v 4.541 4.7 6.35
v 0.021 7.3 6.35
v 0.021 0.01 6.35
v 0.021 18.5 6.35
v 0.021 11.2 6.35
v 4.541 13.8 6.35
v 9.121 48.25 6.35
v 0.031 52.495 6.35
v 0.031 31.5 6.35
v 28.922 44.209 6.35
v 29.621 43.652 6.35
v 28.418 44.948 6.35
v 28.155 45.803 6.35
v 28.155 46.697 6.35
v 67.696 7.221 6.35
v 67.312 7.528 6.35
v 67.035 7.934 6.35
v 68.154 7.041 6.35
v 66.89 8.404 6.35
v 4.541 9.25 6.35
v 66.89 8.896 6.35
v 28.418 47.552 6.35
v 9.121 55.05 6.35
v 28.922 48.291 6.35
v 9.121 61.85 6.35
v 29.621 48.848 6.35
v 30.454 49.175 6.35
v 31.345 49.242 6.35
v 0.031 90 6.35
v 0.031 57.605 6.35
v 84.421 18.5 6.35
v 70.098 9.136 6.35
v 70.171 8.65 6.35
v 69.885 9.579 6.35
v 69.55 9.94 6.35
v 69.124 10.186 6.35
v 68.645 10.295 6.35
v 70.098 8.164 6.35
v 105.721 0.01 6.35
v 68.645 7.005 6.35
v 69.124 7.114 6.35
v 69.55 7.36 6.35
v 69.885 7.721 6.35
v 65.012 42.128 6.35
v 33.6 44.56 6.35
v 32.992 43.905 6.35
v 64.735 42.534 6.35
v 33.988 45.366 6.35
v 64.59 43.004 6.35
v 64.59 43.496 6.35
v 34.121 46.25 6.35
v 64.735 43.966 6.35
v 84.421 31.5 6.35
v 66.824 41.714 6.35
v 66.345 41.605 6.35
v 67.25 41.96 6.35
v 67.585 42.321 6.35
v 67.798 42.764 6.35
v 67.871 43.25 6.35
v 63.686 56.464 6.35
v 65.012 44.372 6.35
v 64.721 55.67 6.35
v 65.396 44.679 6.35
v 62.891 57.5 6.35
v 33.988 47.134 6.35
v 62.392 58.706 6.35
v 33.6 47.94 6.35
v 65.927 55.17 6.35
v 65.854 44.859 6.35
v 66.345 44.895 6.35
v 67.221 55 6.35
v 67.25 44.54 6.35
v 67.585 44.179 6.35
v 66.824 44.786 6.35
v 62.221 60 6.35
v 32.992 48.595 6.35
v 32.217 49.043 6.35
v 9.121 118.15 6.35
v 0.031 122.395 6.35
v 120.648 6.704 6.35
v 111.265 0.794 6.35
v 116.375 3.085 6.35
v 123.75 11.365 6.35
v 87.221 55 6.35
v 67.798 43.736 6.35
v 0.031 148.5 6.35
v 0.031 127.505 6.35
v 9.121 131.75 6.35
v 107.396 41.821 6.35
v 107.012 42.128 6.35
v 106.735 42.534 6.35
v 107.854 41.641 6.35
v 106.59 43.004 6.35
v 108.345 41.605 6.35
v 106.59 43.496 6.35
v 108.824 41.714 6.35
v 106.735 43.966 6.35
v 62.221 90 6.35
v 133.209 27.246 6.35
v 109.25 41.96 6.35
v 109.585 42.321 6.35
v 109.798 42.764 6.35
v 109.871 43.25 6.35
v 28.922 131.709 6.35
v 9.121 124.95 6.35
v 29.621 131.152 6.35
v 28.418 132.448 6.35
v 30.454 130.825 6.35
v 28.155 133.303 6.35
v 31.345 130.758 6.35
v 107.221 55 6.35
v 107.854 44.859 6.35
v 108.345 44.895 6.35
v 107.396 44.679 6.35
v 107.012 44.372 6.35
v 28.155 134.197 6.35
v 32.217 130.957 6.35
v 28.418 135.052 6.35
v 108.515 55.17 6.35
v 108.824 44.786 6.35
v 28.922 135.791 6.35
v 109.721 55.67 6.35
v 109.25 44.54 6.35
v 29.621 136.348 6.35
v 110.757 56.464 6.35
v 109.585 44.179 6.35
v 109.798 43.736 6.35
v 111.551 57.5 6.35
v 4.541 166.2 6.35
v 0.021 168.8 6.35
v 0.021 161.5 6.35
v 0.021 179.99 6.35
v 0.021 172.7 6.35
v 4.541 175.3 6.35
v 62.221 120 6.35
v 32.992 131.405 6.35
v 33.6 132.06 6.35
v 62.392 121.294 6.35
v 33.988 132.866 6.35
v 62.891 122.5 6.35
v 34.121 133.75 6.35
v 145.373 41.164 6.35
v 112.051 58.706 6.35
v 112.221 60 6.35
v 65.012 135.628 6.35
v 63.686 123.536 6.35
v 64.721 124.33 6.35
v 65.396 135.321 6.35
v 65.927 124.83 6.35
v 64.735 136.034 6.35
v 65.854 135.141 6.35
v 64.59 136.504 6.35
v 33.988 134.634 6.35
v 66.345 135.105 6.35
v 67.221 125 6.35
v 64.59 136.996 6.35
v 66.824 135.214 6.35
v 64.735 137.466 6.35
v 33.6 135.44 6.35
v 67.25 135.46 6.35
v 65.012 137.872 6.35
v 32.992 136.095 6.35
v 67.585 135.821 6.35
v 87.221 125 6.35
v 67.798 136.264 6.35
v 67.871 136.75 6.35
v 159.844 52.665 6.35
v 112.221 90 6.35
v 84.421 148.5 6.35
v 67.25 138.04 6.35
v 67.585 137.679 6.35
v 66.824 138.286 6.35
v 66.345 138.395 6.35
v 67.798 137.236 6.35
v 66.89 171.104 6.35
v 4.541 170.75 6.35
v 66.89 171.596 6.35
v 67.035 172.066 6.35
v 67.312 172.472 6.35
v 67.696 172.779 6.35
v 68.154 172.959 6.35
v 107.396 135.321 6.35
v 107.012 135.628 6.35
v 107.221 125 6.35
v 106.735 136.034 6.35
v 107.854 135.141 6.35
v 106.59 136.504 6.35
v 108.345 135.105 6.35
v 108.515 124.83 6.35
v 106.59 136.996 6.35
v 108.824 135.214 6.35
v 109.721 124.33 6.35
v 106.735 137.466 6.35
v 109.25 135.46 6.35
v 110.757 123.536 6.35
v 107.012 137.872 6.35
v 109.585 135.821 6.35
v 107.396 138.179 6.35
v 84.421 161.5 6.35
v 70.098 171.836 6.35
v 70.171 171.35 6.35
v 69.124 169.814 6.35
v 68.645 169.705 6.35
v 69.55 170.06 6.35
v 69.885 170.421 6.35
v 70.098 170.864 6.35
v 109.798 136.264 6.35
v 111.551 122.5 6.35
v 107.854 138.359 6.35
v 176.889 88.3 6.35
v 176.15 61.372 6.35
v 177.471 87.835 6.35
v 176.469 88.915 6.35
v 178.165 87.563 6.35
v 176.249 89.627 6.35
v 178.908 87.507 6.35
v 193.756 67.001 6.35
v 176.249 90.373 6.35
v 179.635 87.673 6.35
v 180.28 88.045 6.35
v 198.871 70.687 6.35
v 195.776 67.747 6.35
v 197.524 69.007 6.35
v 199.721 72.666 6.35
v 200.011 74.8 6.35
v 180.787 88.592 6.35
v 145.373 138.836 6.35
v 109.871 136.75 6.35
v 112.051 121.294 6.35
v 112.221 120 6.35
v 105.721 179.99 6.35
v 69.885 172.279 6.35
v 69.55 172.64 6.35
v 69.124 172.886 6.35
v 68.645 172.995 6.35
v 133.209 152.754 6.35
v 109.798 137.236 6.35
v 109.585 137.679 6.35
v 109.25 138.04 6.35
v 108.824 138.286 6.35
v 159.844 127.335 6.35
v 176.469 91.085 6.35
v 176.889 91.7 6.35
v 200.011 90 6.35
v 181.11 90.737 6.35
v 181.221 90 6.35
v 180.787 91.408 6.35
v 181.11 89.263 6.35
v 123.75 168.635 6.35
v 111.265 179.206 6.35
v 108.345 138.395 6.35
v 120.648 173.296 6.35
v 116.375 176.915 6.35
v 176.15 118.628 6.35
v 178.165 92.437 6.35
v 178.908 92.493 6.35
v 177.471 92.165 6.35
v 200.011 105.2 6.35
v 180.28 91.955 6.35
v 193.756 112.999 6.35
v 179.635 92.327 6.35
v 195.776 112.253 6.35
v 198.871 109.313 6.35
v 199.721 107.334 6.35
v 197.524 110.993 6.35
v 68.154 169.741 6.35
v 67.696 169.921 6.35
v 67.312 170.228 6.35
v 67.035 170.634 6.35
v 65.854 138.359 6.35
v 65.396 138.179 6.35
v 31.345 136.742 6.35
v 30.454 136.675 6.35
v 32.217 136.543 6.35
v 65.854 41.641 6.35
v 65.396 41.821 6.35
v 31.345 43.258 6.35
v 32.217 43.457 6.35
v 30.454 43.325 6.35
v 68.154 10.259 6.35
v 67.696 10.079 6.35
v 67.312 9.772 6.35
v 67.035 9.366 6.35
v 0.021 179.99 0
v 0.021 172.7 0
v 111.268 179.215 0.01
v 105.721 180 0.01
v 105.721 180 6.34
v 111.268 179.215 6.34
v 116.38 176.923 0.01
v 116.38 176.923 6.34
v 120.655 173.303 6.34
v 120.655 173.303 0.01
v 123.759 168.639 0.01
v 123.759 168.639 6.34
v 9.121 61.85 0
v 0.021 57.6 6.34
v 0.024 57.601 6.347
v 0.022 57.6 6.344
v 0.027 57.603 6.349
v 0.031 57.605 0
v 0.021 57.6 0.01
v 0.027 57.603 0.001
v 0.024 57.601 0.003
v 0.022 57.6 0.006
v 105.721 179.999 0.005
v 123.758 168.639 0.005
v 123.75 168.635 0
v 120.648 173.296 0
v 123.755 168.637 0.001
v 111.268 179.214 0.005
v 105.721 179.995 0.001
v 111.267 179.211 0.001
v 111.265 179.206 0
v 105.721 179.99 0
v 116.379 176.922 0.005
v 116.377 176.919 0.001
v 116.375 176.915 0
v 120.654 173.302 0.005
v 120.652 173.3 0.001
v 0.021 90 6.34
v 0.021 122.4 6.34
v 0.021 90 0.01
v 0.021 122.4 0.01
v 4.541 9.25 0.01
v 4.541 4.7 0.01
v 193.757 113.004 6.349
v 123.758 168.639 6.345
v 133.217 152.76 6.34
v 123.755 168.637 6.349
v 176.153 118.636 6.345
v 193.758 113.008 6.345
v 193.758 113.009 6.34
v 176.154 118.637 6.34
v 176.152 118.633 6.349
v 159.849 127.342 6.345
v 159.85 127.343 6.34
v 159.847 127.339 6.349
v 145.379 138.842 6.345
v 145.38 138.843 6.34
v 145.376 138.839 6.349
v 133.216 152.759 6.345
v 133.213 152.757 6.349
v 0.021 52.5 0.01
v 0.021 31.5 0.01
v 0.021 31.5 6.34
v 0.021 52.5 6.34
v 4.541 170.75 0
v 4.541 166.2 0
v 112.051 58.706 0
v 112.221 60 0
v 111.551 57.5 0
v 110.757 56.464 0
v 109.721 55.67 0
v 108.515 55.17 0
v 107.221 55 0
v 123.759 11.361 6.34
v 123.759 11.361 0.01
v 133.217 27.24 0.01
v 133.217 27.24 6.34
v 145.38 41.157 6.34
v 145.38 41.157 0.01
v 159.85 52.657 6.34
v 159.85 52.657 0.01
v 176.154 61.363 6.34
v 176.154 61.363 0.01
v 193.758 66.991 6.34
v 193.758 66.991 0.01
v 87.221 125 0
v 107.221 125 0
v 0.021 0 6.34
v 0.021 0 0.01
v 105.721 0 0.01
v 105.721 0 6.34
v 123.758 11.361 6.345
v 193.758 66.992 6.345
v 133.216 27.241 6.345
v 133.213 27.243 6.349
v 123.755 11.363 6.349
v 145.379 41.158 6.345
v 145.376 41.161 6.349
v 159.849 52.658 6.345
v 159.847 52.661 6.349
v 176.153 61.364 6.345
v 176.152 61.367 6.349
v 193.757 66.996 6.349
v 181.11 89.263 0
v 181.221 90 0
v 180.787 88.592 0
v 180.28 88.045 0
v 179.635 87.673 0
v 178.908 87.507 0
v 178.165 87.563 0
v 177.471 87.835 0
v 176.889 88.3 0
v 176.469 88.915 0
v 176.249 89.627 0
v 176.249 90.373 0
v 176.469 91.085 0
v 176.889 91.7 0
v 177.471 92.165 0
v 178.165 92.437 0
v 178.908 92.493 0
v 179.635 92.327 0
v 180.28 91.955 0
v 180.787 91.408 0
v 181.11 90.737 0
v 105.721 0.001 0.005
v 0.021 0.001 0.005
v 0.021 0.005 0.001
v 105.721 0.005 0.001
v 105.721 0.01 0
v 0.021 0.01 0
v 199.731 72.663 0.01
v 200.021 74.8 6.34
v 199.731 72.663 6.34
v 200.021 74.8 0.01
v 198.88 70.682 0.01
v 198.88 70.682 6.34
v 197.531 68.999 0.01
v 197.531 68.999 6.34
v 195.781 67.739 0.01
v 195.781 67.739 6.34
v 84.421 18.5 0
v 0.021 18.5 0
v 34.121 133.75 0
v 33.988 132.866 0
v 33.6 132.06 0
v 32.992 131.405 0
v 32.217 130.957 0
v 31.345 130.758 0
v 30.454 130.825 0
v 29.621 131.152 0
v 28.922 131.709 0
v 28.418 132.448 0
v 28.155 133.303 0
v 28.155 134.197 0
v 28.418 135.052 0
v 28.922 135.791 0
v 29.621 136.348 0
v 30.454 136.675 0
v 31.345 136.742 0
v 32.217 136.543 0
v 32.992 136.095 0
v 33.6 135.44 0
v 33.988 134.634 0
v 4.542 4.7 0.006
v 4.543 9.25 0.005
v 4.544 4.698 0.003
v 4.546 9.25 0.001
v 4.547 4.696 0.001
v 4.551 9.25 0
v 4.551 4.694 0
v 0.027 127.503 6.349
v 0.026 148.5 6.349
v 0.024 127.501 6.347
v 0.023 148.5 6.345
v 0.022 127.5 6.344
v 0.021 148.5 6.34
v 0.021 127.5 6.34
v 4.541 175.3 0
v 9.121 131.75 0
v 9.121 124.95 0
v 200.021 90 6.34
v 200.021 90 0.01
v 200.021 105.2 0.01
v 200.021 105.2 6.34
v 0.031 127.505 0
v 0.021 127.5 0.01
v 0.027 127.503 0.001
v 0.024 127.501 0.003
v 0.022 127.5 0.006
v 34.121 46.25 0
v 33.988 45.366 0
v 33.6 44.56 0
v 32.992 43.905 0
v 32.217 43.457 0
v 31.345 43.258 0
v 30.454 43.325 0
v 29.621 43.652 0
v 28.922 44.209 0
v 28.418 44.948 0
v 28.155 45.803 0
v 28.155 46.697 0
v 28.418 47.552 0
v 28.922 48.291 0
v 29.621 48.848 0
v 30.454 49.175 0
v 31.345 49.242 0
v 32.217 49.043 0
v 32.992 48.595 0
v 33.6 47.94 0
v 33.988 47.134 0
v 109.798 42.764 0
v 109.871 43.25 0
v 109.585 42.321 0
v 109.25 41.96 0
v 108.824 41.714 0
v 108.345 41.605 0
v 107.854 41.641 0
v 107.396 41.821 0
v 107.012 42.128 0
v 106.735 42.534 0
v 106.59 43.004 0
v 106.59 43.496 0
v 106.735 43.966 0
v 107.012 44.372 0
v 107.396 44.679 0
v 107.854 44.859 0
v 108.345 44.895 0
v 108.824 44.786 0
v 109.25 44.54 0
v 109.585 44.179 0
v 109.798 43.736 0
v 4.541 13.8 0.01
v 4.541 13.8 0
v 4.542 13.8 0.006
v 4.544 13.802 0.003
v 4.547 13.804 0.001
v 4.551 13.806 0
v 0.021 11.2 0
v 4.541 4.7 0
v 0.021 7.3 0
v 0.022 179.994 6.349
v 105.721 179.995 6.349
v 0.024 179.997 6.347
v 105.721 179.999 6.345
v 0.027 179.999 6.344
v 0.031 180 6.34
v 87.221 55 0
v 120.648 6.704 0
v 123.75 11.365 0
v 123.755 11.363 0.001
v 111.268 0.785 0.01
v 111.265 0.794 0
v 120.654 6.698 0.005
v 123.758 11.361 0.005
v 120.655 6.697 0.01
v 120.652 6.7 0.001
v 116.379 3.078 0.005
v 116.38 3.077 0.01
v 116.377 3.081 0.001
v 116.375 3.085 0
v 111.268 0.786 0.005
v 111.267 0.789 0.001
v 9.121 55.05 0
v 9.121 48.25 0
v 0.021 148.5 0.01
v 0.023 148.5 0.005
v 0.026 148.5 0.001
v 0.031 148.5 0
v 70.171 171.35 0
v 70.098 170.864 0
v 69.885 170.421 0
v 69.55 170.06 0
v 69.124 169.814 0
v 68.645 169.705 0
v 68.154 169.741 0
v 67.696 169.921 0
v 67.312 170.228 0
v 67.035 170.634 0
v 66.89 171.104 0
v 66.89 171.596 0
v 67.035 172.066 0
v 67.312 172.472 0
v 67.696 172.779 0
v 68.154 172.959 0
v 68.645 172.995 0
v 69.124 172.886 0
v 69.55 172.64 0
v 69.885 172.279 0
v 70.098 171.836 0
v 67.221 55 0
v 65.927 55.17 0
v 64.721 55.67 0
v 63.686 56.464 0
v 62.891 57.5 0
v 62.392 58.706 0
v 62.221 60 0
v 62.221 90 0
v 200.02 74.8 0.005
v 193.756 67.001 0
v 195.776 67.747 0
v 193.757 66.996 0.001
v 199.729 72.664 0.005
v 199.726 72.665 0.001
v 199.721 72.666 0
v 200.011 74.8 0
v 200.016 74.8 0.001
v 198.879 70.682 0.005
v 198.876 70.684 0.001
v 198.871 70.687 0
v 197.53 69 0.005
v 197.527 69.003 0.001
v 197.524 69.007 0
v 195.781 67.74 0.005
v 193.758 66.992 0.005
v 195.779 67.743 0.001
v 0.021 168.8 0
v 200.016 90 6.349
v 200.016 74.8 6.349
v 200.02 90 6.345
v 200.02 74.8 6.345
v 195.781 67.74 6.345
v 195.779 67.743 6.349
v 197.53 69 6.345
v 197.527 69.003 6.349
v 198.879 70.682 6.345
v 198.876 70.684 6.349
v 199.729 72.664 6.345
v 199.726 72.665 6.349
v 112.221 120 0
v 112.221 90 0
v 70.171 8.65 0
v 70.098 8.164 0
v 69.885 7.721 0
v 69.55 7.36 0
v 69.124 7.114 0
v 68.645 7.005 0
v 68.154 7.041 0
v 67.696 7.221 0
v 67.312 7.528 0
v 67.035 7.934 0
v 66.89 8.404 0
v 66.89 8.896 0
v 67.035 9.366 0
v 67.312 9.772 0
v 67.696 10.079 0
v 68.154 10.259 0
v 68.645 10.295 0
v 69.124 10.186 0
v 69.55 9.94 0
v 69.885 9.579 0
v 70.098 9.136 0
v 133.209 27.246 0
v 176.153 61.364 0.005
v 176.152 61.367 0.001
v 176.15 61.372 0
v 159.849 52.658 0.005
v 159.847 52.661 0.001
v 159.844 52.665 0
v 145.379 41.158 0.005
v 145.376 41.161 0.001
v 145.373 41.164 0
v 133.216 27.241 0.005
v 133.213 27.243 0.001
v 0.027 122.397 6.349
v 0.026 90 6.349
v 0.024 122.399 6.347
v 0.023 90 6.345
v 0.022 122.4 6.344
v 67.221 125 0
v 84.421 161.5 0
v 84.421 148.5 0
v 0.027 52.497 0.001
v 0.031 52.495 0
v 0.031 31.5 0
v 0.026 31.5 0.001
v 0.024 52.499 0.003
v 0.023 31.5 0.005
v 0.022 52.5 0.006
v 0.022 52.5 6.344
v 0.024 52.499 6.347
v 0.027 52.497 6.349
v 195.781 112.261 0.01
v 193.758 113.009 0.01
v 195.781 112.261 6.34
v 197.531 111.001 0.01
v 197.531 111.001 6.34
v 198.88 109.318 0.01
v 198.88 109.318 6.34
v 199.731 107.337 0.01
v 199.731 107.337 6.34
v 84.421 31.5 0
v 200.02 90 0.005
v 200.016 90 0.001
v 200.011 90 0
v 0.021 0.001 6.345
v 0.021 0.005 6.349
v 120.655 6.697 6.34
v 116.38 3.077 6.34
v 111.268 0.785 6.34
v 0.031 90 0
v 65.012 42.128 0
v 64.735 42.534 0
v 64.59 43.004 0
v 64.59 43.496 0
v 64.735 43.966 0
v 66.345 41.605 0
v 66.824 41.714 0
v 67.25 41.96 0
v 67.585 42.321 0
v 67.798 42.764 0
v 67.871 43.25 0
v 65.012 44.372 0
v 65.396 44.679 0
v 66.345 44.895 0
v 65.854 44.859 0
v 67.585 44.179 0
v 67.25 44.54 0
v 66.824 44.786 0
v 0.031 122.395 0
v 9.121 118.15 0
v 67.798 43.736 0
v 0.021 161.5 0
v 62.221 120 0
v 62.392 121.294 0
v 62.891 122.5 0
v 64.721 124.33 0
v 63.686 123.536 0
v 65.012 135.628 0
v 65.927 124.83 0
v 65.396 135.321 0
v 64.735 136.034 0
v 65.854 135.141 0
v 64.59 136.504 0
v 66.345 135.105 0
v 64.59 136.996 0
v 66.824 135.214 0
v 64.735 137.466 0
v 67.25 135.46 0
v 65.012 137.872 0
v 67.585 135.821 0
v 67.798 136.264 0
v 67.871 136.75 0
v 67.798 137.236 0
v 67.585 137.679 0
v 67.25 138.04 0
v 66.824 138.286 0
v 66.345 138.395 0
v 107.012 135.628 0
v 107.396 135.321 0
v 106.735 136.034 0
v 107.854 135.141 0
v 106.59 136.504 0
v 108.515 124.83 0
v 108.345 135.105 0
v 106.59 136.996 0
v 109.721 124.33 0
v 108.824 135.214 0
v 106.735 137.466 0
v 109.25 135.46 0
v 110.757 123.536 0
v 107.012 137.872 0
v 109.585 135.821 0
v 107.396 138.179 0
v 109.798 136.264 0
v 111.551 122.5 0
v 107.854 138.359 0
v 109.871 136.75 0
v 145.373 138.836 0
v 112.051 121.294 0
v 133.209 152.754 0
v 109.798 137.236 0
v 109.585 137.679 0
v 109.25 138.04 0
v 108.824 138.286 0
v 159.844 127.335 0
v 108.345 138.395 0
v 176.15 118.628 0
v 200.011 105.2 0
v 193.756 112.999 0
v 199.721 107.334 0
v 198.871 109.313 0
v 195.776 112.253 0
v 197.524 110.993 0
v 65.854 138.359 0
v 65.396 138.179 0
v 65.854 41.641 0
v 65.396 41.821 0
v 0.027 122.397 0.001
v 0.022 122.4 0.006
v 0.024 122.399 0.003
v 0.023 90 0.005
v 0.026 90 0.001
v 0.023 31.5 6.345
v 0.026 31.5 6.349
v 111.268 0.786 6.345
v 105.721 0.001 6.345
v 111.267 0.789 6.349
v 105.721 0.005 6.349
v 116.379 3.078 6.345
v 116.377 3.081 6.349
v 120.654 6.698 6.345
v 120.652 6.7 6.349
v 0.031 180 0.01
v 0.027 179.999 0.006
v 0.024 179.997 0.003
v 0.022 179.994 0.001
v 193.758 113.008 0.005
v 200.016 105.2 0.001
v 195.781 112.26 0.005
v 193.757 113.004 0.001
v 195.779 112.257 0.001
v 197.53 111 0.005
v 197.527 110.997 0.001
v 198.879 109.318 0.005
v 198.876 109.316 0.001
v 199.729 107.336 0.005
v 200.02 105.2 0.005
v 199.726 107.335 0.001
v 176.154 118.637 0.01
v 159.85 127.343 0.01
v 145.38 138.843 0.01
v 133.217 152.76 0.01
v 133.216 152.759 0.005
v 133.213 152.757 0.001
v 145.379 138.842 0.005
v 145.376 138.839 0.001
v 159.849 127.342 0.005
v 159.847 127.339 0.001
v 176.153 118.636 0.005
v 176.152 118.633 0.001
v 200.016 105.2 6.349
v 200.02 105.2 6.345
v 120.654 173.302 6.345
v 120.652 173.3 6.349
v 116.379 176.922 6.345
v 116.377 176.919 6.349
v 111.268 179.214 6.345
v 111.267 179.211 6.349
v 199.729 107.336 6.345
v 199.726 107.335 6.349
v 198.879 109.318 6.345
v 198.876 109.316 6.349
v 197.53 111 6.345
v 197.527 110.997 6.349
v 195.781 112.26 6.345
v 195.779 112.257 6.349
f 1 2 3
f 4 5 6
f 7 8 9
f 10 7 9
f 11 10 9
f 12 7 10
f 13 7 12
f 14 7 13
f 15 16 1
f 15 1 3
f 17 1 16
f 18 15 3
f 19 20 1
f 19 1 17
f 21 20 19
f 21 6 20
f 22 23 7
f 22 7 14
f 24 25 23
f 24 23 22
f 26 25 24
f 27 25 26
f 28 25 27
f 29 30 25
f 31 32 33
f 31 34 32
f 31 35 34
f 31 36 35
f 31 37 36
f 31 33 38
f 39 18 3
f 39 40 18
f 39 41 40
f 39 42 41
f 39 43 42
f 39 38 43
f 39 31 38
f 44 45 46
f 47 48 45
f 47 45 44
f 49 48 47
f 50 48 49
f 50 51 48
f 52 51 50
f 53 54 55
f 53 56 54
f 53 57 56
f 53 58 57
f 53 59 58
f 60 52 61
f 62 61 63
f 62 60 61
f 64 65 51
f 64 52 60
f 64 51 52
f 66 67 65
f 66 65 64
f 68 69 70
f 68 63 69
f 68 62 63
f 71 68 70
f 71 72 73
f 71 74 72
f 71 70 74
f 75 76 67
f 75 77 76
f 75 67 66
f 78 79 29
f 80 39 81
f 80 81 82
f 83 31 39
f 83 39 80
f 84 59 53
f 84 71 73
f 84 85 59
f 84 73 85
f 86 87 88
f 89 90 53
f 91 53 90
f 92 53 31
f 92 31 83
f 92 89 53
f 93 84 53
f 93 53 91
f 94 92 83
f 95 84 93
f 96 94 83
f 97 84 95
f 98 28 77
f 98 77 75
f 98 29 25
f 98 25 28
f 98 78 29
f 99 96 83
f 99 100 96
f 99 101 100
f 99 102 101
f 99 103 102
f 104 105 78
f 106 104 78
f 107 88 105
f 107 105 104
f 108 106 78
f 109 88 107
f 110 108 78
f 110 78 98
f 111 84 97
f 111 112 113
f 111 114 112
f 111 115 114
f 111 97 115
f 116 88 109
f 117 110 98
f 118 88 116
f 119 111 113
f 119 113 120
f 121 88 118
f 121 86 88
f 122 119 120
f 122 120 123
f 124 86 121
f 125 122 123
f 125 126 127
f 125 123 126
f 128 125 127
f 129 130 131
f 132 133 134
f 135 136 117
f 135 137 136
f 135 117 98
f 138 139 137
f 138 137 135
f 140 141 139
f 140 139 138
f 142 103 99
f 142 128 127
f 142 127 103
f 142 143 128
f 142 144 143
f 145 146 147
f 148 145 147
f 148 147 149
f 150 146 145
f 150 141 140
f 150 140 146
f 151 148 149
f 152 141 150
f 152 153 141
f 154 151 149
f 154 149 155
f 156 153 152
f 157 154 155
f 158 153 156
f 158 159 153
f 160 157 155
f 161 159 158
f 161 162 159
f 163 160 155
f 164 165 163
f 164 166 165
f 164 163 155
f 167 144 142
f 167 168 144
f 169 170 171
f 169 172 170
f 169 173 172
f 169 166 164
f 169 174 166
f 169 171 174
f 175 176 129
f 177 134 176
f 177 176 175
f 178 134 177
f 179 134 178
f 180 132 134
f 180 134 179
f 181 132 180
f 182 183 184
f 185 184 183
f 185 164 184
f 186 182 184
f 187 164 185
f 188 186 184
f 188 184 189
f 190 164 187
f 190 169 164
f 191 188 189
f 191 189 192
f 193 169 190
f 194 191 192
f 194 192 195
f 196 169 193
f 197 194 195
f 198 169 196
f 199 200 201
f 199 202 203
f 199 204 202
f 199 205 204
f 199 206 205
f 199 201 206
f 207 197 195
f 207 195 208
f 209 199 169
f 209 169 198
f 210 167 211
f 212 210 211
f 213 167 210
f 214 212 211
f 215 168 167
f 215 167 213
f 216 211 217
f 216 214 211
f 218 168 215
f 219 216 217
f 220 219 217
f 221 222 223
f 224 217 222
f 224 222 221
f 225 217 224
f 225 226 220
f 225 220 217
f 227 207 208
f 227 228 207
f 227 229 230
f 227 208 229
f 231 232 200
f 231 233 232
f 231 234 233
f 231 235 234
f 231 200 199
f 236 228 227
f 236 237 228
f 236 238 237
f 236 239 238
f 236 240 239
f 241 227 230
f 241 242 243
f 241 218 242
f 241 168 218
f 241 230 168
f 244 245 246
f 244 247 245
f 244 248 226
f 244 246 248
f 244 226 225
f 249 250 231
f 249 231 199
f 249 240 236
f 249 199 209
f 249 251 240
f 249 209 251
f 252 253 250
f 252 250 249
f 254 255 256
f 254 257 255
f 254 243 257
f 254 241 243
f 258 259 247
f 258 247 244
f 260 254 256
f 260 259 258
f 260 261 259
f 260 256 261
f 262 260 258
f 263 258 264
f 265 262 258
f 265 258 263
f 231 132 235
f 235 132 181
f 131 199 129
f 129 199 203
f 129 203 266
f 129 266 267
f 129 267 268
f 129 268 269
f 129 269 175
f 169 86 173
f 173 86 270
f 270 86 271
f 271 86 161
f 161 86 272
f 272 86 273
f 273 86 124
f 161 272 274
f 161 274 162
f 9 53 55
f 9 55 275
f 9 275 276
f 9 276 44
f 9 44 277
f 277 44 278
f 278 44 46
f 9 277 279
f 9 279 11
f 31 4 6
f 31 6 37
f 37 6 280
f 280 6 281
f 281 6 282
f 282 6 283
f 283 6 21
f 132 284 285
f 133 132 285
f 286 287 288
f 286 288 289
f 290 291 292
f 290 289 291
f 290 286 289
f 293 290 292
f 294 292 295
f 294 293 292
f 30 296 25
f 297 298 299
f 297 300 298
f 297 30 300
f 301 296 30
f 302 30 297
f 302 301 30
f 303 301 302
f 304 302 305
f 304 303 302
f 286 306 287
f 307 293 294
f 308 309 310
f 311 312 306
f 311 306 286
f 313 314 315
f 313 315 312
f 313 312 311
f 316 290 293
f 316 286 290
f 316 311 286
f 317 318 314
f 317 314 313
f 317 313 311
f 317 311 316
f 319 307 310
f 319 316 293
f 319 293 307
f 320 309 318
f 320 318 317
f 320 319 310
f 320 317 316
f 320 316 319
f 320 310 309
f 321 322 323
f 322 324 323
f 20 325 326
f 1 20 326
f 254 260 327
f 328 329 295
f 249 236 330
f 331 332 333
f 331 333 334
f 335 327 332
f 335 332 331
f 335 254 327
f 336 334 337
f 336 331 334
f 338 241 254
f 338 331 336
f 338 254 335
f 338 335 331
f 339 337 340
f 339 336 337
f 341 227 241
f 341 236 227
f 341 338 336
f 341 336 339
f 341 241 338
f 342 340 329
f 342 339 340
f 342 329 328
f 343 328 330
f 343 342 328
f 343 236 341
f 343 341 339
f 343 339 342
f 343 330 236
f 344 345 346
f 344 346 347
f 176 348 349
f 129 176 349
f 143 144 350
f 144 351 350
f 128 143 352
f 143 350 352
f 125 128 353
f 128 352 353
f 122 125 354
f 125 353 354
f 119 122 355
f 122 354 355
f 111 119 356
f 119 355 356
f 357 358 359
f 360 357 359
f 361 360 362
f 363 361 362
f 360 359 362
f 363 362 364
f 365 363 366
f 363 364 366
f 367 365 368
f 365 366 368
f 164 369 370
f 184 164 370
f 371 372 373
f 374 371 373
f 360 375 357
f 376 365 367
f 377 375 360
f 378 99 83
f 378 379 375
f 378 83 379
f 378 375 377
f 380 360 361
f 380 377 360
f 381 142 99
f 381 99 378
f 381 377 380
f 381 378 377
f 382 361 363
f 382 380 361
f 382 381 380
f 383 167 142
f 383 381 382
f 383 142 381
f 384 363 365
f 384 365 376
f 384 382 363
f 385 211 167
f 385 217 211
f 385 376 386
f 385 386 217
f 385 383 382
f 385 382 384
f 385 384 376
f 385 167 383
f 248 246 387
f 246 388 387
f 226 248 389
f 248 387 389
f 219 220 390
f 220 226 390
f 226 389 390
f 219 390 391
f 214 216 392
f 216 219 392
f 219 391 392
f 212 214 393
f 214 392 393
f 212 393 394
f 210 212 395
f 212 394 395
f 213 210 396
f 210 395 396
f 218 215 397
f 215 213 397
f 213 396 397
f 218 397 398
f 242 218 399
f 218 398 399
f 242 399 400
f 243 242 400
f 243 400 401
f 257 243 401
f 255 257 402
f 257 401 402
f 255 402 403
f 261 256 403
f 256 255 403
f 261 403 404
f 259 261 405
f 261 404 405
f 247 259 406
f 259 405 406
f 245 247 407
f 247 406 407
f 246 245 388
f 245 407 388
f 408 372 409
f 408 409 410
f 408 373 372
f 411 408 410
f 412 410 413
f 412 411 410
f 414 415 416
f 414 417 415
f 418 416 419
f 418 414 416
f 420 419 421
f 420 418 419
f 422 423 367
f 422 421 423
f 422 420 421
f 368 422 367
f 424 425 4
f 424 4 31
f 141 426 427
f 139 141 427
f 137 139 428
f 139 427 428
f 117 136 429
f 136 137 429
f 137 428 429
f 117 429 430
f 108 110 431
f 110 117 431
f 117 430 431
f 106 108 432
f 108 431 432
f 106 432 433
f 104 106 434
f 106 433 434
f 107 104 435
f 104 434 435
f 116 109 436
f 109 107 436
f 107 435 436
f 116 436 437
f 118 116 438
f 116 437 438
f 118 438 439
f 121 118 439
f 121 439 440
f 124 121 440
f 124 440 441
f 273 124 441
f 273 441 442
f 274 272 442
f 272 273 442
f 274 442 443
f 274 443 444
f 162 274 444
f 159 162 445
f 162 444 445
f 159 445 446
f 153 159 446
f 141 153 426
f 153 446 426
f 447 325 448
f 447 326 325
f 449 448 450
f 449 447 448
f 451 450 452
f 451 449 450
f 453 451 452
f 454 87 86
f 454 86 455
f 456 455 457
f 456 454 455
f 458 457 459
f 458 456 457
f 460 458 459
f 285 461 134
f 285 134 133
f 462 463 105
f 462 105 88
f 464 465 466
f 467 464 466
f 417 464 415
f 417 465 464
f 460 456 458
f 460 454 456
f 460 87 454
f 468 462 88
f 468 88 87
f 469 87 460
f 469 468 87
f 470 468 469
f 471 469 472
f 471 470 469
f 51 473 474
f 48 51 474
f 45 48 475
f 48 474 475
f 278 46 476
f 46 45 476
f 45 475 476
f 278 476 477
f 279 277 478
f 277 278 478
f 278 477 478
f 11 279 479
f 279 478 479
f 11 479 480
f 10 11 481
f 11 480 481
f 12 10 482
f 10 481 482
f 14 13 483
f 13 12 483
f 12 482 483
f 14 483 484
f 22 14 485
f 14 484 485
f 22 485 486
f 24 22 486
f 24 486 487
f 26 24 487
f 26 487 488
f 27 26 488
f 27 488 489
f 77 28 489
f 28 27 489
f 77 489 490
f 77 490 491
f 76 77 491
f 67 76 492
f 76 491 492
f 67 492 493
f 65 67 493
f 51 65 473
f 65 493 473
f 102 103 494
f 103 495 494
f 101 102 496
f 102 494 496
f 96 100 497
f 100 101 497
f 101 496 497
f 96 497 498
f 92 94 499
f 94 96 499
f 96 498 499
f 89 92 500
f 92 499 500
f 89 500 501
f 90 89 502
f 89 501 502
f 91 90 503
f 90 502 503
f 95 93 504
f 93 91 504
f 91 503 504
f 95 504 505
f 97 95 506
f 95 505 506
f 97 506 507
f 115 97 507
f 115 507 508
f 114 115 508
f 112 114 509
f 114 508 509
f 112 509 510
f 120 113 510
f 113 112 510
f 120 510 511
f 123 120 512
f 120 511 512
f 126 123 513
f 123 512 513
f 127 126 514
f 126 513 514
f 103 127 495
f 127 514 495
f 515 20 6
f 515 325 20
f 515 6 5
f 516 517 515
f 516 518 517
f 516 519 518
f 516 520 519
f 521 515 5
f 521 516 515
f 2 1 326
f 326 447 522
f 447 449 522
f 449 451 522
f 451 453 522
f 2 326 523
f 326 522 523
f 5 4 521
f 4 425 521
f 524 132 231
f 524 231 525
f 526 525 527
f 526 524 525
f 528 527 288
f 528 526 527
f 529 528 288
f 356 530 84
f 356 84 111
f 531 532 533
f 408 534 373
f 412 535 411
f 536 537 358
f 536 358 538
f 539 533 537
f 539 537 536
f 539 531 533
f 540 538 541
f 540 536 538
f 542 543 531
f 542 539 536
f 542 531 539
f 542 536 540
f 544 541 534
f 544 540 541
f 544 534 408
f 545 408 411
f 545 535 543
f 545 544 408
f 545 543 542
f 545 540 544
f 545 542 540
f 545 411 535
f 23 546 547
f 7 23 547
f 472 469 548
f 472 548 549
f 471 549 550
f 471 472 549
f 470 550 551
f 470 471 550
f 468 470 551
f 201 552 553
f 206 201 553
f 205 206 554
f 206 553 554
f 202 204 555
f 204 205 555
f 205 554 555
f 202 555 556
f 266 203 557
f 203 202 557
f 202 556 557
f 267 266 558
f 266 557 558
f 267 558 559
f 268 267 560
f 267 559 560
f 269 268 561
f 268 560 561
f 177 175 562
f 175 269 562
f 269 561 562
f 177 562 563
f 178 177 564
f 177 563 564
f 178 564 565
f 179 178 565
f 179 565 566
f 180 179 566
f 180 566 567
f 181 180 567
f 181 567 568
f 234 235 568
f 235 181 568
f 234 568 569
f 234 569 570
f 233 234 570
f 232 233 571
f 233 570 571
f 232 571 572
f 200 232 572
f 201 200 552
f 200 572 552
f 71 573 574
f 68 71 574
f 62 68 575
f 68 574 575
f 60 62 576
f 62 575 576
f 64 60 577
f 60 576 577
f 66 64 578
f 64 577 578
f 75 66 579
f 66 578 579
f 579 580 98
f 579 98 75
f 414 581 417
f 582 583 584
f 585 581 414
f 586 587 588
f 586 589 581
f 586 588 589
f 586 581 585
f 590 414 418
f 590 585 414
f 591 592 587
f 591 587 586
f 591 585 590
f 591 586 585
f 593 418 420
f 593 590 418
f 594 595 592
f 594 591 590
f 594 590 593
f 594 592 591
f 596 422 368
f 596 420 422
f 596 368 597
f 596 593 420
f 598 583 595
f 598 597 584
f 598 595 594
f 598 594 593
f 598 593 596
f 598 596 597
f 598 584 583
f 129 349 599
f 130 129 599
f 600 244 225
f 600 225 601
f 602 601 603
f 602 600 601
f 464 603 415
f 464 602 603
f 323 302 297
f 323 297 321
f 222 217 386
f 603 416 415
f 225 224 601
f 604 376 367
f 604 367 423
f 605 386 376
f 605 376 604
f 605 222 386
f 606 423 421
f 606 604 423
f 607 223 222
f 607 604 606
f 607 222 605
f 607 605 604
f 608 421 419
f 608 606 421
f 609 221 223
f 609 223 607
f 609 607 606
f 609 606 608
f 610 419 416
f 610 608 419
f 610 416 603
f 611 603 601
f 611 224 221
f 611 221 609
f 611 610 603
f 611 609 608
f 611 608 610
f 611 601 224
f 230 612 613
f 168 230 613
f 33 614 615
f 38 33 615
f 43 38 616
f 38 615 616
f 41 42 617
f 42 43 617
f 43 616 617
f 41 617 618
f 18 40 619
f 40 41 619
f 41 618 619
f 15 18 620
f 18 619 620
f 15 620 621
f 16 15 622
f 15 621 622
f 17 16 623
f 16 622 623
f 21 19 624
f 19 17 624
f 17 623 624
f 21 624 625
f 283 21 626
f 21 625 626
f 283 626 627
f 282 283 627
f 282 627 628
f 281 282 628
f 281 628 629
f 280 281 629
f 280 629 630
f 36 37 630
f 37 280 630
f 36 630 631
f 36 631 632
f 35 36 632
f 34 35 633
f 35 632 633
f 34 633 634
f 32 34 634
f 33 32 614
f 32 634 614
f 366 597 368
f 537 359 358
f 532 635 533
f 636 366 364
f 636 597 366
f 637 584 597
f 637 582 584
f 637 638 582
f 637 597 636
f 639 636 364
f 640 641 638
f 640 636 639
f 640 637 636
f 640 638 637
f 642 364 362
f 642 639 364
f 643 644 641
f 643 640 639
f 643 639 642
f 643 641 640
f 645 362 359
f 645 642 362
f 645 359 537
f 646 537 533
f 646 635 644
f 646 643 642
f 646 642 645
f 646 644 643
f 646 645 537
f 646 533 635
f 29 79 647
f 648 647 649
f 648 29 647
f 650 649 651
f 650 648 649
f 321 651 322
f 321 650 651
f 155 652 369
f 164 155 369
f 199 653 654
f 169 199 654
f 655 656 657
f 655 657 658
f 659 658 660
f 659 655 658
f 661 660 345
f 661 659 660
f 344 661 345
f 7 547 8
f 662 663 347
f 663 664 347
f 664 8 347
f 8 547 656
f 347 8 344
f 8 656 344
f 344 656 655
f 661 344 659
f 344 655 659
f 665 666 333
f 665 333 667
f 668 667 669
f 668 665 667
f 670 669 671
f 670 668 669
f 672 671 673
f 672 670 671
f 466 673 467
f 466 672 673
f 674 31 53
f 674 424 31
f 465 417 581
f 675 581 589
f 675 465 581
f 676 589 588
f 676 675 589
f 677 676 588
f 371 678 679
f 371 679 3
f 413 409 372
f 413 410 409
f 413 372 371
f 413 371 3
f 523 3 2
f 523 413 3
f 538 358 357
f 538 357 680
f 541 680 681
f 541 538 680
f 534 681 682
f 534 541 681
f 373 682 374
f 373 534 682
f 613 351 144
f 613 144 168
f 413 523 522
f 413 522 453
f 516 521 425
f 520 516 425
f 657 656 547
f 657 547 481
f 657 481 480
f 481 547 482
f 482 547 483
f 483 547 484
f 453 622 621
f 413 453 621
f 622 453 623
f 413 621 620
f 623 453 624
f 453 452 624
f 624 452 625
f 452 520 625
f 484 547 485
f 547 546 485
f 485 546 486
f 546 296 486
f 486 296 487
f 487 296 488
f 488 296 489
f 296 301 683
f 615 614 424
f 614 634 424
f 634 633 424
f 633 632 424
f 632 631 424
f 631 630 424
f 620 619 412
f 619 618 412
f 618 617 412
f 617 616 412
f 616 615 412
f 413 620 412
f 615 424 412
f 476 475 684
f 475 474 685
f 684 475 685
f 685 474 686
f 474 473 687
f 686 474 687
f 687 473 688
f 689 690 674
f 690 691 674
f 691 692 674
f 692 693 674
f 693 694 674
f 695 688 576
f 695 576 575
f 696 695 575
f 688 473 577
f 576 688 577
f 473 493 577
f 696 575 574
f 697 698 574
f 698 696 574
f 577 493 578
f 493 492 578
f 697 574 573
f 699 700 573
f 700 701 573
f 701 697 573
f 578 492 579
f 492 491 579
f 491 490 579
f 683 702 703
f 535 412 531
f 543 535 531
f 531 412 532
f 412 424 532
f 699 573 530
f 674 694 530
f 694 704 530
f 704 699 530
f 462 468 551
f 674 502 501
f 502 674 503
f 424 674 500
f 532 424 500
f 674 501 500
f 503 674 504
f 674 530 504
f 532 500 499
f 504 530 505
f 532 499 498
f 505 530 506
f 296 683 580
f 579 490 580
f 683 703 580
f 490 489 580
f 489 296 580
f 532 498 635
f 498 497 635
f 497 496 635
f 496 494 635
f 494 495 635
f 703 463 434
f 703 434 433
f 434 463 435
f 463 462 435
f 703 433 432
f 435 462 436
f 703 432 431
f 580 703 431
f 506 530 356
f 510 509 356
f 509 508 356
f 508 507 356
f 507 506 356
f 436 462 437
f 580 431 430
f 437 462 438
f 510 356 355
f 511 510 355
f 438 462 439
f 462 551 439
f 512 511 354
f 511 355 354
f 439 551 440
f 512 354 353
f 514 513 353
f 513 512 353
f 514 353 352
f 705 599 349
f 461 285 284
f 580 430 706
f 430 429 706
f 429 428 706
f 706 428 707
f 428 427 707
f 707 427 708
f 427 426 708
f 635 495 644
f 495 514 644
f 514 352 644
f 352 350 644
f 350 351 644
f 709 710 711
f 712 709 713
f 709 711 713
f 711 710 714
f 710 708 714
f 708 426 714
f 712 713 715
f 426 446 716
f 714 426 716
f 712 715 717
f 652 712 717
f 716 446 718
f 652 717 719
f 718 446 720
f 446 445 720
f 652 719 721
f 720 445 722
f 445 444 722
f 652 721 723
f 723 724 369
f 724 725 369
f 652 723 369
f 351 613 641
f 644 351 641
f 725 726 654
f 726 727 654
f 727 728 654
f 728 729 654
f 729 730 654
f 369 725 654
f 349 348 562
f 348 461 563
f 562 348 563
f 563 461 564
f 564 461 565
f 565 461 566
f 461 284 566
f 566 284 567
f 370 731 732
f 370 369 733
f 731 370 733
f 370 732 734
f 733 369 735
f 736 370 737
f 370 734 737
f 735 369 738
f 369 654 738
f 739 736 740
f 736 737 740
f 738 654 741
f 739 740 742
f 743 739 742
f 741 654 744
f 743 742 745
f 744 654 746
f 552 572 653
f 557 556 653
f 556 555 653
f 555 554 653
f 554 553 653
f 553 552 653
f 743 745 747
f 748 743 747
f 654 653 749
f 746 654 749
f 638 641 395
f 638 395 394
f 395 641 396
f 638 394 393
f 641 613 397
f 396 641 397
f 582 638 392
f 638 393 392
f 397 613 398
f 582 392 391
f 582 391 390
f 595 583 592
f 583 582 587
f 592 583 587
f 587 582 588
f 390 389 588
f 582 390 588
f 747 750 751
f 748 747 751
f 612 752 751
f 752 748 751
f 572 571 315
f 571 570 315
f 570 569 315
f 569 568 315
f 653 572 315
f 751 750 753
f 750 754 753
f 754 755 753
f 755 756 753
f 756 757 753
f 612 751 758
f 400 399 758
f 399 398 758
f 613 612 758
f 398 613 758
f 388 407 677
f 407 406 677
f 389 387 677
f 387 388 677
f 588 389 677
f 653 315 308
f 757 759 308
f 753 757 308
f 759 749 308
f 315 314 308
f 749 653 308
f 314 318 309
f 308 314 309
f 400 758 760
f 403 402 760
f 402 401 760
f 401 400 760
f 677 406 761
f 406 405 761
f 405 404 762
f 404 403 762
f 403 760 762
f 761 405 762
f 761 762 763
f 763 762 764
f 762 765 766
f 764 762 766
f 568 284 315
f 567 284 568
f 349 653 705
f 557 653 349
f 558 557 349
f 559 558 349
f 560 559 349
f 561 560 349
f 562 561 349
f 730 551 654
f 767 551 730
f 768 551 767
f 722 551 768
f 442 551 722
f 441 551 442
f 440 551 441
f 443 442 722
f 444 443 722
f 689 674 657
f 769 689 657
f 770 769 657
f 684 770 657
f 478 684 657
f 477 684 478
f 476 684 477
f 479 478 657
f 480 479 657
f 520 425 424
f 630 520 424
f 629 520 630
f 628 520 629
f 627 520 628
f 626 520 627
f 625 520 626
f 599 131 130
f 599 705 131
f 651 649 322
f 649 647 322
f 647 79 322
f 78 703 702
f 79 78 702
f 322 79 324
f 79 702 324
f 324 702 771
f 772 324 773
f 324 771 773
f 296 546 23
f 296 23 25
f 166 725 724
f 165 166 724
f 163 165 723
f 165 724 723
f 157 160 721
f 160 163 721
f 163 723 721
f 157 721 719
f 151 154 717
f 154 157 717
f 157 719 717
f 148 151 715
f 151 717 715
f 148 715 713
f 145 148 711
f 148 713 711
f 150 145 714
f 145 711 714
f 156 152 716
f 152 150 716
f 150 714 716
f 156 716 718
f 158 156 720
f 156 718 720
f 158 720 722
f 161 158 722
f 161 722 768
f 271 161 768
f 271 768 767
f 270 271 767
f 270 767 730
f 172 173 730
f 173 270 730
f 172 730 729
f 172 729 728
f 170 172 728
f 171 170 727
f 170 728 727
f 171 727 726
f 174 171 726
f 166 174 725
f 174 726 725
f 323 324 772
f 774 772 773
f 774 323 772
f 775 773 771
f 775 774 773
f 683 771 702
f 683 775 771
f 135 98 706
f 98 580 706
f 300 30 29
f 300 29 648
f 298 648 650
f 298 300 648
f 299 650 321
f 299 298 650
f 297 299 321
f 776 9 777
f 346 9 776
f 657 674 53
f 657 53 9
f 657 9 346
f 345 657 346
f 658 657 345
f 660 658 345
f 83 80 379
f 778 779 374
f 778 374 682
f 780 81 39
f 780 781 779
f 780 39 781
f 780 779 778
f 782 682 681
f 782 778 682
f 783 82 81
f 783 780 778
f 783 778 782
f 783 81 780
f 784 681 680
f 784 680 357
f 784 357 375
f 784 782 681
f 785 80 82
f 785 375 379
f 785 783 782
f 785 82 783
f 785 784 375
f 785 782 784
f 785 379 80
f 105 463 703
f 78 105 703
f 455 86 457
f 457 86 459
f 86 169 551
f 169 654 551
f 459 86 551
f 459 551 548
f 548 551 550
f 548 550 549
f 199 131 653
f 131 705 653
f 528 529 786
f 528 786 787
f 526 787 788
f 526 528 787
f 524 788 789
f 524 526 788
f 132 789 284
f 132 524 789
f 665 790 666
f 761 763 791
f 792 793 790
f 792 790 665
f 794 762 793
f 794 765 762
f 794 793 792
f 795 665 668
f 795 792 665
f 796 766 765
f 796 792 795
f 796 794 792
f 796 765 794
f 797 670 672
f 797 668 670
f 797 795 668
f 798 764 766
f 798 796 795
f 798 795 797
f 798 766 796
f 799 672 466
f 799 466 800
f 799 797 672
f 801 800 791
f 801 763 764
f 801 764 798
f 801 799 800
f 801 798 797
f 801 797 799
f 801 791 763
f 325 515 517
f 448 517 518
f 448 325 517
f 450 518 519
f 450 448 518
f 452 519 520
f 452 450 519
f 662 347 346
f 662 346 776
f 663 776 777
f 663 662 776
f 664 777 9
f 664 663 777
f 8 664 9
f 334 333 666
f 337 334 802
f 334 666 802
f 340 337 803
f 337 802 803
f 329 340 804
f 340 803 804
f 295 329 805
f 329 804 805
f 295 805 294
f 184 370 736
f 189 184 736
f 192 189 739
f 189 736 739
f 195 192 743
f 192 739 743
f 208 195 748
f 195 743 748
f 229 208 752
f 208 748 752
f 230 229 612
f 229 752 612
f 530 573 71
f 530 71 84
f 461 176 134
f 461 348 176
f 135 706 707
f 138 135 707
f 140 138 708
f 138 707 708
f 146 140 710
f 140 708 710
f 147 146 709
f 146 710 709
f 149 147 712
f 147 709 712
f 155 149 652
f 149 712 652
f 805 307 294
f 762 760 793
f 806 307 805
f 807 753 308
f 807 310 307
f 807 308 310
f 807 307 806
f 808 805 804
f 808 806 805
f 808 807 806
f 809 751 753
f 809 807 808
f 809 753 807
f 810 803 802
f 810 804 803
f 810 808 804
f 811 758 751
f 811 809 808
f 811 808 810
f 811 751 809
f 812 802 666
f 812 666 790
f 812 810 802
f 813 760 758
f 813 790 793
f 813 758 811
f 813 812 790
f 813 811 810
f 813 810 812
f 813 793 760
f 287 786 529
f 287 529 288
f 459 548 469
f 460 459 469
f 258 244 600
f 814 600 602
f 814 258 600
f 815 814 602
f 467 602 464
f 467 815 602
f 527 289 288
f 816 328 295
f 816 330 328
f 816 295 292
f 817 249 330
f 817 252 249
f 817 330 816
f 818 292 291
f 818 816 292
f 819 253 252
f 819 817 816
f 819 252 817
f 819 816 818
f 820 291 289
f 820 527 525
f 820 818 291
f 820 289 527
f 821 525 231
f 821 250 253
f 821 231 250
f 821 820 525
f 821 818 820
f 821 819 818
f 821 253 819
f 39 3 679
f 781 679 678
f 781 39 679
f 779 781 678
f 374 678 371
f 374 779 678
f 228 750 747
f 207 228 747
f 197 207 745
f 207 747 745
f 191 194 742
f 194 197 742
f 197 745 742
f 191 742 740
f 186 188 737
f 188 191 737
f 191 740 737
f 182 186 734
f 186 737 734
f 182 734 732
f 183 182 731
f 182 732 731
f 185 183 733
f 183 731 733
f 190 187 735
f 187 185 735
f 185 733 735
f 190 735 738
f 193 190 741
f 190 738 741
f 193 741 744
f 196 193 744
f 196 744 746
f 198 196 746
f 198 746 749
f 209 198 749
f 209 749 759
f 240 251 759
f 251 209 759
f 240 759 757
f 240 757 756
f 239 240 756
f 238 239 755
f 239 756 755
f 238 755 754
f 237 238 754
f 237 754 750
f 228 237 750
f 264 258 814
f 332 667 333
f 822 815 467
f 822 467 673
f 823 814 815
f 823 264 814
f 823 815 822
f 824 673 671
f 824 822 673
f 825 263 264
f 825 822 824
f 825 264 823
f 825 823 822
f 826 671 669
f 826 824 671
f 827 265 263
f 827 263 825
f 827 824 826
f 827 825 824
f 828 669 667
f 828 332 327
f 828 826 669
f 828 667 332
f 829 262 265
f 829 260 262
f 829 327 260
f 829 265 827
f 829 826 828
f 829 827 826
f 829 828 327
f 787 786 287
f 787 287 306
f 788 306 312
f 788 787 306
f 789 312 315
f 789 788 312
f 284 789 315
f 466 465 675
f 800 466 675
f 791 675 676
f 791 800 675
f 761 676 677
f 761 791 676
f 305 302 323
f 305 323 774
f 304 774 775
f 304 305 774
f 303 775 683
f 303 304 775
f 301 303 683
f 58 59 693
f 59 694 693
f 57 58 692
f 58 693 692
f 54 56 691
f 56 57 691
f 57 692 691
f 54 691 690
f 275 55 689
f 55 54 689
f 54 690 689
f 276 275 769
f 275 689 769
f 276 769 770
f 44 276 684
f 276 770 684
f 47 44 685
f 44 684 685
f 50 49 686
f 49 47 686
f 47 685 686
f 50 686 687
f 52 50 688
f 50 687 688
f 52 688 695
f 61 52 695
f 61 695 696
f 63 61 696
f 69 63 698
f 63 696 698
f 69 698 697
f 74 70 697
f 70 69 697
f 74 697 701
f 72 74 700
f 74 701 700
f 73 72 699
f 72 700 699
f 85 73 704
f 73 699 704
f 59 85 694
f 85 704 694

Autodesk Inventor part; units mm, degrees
ref_plane "YZ Plane" through (0, 0, 0) normal (1, 0, 0) x (0, 1, 0)
ref_plane "XZ Plane" through (0, 0, 0) normal (0, 1, 0) x (-1, 0, 0)
ref_plane "XY Plane" through (0, 0, 0) normal (0, 0, 1) x (1, 0, 0)
sketch "Boceto1" plane through (0, 0, 0) normal (0, 0, 1) x (1, 0, 0)
  line L0 (0.0213, 161.5) -> (84.4213, 161.5)
  line L1 (0.0213, 180) -> (0.0213, 172.7)
  line L2 (0.0213, 161.5) -> (0.0213, 168.8)
  line L3 (4.5413, 170.75) -> (4.5413, 175.3)
  line L4 (4.5413, 175.3) -> (0.0213, 172.7)
  line L5 (4.5413, 170.75) -> (4.5413, 166.2)
  line L6 (4.5413, 166.2) -> (0.0213, 168.8)
  line L7 (0.0213, 161.5) -> (84.4213, 161.5)
  line L8 (84.4213, 161.5) -> (84.4213, 148.5)
  line L9 (84.4213, 148.5) -> (0.0213, 148.5)
  line L10 (0.0213, 148.5) -> (0.0213, 127.5)
  line L11 (9.1213, 124.95) -> (9.1213, 131.75)
  line L12 (9.1213, 131.75) -> (0.0213, 127.5)
  line L13 (9.1213, 124.95) -> (9.1213, 118.15)
  line L14 (9.1213, 118.15) -> (0.0213, 122.4)
  line L15 (0.0213, 122.4) -> (0.0213, 90)
  line L16 (0.0213, 180) -> (105.7213, 180)
  line L17 (200.0213, 90) -> (200.0213, 105.2)
  arc A0 (200.0213, 105.2) -> (193.7585, 113.0091) centre (192.0213, 105.2) ccw
  arc A1 (123.7591, 168.6393) -> (105.7213, 180) centre (105.7213, 160) ccw
  arc A2 (123.7591, 168.6393) -> (193.7585, 113.0091) centre (215.9584, 212.7984) ccw
  line L18 (62.2213, 90) -> (62.2213, 120)
  line L19 (112.2213, 120) -> (112.2213, 90)
  circle A3 centre (178.7213, 90) radius 2.5
  circle A4 centre (31.1213, 133.75) radius 3
  line L20 (67.2213, 125) -> (87.2213, 125)
  arc A5 (67.2213, 125) -> (62.2213, 120) centre (67.2213, 120) ccw
  circle A6 centre (66.2213, 136.75) radius 1.65
  circle A7 centre (108.2213, 136.75) radius 1.65
  circle A8 centre (68.5213, 171.35) radius 1.65
  line L21 (87.2213, 125) -> (107.2213, 125)
  arc A9 (112.2213, 120) -> (107.2213, 125) centre (107.2213, 120) ccw
  line L22 (0.0213, 18.5) -> (84.4213, 18.5)
  line L23 (0.0213, 0) -> (0.0213, 7.3)
  line L24 (0.0213, 18.5) -> (0.0213, 11.2)
  line L25 (4.5413, 9.25) -> (4.5413, 4.7)
  line L26 (4.5413, 4.7) -> (0.0213, 7.3)
  line L27 (4.5413, 9.25) -> (4.5413, 13.8)
  line L28 (4.5413, 13.8) -> (0.0213, 11.2)
  line L29 (0.0213, 18.5) -> (84.4213, 18.5)
  line L30 (84.4213, 18.5) -> (84.4213, 31.5)
  line L31 (84.4213, 31.5) -> (0.0213, 31.5)
  line L32 (0.0213, 31.5) -> (0.0213, 52.5)
  line L33 (9.1213, 55.05) -> (9.1213, 48.25)
  line L34 (9.1213, 48.25) -> (0.0213, 52.5)
  line L35 (9.1213, 55.05) -> (9.1213, 61.85)
  line L36 (9.1213, 61.85) -> (0.0213, 57.6)
  line L37 (0.0213, 57.6) -> (0.0213, 90)
  line L38 (0.0213, 0) -> (105.7213, 0)
  line L39 (200.0213, 90) -> (200.0213, 74.8)
  arc A10 (193.7585, 66.9909) -> (200.0213, 74.8) centre (192.0213, 74.8) ccw
  arc A11 (105.7213, 0) -> (123.7591, 11.3607) centre (105.7213, 20) ccw
  arc A12 (193.7585, 66.9909) -> (123.7591, 11.3607) centre (215.9584, -32.7984) ccw
  line L40 (62.2213, 90) -> (62.2213, 60)
  line L41 (112.2213, 60) -> (112.2213, 90)
  circle A13 centre (178.7213, 90) radius 2.5
  circle A14 centre (31.1213, 46.25) radius 3
  line L42 (67.2213, 55) -> (87.2213, 55)
  arc A15 (62.2213, 60) -> (67.2213, 55) centre (67.2213, 60) ccw
  circle A16 centre (66.2213, 43.25) radius 1.65
  circle A17 centre (108.2213, 43.25) radius 1.65
  circle A18 centre (68.5213, 8.65) radius 1.65
  line L43 (87.2213, 55) -> (107.2213, 55)
  arc A19 (107.2213, 55) -> (112.2213, 60) centre (107.2213, 60) ccw
  point P0 (0, 0)
extrude "Extrusión1" add sketch "Boceto1" along normal blind 6.35
fillet "Empalme1" radius 0.01 26 edges at (116.38, 176.9231, 0) (152.3544, 132.7655, 0) (198.2622, 110.2051, 0) (200.0213, 97.6, 0) (198.2622, 69.7949, 0) (152.3544, 47.2345, 0) (116.38, 3.0769, 0) (52.8713, 0, 0) (52.8713, 180, 0) (116.38, 176.9231, 6.35) (152.3544, 132.7655, 6.35) (198.2622, 110.2051, 6.35) (200.0213, 97.6, 6.35) (198.2622, 69.7949, 6.35) (152.3544, 47.2345, 6.35) (116.38, 3.0769, 6.35) (52.8713, 0, 6.35) (52.8713, 180, 6.35) (0.0213, 180, 3.175) (0.0213, 138, 6.35) (0.0213, 138, 0) (0.0213, 106.2, 6.35) (0.0213, 106.2, 0) (0.0213, 42, 6.35) (0.0213, 42, 0) (4.5413, 6.975, 0)
sketch "Boceto2" plane through (0, 0, 6.35) normal (0, 0, 1) x (1, 0, 0)
  point P0 (0, 0)
properties part number "amir"
